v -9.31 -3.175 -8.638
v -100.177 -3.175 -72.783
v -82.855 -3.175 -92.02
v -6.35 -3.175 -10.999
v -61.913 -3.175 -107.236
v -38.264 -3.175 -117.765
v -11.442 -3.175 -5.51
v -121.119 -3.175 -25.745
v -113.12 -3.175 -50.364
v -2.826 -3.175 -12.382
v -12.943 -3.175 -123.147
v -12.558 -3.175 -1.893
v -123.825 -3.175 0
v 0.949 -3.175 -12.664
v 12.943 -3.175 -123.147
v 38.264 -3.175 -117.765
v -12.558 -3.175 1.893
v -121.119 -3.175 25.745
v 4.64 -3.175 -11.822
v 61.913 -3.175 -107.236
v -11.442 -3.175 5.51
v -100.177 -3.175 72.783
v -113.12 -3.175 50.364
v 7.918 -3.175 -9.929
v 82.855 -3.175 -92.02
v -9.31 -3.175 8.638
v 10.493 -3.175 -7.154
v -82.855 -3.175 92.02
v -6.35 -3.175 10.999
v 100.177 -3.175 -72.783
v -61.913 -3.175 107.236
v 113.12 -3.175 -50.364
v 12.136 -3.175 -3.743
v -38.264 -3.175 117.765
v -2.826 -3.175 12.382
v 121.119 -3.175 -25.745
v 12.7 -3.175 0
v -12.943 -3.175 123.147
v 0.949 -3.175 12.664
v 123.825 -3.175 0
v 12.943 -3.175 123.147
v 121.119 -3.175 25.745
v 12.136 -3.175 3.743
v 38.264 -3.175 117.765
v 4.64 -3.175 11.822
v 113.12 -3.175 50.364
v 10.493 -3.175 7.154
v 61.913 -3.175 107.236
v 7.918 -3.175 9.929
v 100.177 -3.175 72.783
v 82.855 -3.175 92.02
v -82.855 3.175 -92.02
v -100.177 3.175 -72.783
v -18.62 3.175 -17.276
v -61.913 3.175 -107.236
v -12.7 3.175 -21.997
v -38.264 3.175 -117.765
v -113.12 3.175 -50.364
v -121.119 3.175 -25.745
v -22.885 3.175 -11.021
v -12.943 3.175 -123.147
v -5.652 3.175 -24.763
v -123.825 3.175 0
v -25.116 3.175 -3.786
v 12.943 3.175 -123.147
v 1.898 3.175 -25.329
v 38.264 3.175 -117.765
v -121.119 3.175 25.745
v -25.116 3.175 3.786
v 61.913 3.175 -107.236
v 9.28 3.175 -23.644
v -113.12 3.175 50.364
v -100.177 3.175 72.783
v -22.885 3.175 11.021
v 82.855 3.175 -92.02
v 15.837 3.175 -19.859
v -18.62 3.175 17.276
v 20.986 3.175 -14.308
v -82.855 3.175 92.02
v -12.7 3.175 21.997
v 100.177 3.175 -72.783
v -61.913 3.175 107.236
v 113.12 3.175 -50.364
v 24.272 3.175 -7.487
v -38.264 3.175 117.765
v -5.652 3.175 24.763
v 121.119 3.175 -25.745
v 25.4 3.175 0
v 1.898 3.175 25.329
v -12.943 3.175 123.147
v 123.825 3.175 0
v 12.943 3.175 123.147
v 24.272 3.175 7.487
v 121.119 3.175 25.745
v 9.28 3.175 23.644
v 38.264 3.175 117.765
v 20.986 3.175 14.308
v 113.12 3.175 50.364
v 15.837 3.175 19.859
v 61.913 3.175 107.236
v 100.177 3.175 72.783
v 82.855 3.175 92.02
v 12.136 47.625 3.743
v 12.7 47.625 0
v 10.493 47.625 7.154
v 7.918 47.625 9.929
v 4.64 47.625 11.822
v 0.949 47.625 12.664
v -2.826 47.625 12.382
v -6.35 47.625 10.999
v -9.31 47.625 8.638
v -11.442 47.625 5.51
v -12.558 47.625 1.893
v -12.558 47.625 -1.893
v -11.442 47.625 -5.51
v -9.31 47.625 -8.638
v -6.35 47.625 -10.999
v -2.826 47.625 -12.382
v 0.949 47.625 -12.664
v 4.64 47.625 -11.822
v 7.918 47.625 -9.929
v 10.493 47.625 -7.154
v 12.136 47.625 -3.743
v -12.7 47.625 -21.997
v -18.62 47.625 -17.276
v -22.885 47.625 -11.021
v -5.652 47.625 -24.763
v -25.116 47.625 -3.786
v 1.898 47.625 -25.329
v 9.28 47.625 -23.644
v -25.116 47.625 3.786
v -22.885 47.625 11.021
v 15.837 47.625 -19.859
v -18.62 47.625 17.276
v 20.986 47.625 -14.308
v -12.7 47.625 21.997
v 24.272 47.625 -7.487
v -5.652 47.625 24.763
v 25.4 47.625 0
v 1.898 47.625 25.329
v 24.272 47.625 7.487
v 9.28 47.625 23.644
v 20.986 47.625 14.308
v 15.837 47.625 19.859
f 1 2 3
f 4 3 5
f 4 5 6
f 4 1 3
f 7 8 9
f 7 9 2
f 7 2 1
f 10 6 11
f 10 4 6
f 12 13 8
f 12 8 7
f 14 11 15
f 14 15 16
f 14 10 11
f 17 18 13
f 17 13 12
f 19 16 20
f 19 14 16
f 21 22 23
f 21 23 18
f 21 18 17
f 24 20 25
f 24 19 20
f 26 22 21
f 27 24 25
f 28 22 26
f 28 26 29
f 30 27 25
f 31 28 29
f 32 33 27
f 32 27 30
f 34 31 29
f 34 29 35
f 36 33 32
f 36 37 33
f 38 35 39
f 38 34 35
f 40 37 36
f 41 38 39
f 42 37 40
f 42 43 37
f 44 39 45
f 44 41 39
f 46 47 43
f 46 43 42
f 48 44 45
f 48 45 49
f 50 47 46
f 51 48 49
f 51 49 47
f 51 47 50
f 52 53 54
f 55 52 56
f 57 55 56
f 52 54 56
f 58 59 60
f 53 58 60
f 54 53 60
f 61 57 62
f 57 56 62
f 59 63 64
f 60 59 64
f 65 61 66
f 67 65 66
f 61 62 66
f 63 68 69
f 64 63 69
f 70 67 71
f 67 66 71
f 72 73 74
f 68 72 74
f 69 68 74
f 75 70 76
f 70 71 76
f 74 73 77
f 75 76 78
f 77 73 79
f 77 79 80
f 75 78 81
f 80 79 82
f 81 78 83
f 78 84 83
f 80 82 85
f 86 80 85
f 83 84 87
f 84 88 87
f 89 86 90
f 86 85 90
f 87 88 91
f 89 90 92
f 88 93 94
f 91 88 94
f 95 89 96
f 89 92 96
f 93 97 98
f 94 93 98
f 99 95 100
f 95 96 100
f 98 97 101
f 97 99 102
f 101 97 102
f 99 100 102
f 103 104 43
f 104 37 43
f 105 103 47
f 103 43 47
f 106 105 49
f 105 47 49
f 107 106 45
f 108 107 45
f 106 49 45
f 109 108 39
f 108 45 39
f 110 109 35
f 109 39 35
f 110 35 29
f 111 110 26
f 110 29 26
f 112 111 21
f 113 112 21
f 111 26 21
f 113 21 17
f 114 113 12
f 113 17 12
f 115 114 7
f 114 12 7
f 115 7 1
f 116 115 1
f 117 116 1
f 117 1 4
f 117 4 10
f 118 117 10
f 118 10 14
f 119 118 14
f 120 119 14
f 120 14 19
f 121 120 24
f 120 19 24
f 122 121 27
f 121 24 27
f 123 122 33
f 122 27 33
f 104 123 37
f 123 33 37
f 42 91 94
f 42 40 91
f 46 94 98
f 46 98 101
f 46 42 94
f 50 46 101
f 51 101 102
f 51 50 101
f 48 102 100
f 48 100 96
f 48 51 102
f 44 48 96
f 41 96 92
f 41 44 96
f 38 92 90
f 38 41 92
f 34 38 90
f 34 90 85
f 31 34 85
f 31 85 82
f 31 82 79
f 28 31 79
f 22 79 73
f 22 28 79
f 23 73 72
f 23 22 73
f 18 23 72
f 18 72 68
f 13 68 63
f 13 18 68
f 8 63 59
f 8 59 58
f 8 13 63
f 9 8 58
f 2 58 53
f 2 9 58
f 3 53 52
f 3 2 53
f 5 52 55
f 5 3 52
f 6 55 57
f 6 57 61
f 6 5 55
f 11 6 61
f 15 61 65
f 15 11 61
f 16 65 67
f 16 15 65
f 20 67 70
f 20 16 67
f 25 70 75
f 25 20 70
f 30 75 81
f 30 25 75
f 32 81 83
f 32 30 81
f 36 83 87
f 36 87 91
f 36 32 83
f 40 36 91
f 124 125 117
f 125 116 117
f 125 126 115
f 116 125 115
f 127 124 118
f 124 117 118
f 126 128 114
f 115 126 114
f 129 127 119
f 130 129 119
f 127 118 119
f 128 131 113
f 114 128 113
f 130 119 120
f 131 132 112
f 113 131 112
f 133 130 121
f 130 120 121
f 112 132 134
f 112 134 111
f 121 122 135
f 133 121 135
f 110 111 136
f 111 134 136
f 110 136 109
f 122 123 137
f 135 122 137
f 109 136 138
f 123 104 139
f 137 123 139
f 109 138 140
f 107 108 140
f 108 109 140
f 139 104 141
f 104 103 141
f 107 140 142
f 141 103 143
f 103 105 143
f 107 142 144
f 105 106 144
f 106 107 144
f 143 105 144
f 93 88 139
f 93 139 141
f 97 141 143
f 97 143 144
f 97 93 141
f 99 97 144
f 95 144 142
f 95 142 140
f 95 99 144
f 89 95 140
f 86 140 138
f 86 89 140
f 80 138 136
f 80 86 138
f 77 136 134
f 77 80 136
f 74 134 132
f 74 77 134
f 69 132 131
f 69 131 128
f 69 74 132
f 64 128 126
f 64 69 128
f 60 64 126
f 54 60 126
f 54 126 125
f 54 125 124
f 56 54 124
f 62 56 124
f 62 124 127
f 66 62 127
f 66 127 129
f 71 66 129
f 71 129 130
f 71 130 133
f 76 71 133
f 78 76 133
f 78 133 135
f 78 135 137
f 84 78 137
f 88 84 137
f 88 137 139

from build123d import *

# Parameters (mm, degrees)
F0_R     = 123.825
F1_DEPTH = 3.175
F2_R     = 25.4
F3_DEPTH = 50.8
F4_R     = 12.7
F5_DEPTH = 63.5


with BuildPart() as f1:
    # F0 (on Front) → F1 (new body, symmetric)
    with BuildSketch(Plane.XZ):
        Circle(F0_R)
    extrude(amount=F1_DEPTH, both=True)

    # F2 (on face) → F3 (join)
    with BuildSketch(Plane.XZ.offset(3.175)):
        Circle(F2_R)
    extrude(amount=-F3_DEPTH)

    # F4 (on face) → F5 (cut, symmetric)
    with BuildSketch(Plane.XZ.offset(3.175)):
        Circle(F4_R)
    extrude(amount=F5_DEPTH, both=True, mode=Mode.SUBTRACT)


solid = f1.part
